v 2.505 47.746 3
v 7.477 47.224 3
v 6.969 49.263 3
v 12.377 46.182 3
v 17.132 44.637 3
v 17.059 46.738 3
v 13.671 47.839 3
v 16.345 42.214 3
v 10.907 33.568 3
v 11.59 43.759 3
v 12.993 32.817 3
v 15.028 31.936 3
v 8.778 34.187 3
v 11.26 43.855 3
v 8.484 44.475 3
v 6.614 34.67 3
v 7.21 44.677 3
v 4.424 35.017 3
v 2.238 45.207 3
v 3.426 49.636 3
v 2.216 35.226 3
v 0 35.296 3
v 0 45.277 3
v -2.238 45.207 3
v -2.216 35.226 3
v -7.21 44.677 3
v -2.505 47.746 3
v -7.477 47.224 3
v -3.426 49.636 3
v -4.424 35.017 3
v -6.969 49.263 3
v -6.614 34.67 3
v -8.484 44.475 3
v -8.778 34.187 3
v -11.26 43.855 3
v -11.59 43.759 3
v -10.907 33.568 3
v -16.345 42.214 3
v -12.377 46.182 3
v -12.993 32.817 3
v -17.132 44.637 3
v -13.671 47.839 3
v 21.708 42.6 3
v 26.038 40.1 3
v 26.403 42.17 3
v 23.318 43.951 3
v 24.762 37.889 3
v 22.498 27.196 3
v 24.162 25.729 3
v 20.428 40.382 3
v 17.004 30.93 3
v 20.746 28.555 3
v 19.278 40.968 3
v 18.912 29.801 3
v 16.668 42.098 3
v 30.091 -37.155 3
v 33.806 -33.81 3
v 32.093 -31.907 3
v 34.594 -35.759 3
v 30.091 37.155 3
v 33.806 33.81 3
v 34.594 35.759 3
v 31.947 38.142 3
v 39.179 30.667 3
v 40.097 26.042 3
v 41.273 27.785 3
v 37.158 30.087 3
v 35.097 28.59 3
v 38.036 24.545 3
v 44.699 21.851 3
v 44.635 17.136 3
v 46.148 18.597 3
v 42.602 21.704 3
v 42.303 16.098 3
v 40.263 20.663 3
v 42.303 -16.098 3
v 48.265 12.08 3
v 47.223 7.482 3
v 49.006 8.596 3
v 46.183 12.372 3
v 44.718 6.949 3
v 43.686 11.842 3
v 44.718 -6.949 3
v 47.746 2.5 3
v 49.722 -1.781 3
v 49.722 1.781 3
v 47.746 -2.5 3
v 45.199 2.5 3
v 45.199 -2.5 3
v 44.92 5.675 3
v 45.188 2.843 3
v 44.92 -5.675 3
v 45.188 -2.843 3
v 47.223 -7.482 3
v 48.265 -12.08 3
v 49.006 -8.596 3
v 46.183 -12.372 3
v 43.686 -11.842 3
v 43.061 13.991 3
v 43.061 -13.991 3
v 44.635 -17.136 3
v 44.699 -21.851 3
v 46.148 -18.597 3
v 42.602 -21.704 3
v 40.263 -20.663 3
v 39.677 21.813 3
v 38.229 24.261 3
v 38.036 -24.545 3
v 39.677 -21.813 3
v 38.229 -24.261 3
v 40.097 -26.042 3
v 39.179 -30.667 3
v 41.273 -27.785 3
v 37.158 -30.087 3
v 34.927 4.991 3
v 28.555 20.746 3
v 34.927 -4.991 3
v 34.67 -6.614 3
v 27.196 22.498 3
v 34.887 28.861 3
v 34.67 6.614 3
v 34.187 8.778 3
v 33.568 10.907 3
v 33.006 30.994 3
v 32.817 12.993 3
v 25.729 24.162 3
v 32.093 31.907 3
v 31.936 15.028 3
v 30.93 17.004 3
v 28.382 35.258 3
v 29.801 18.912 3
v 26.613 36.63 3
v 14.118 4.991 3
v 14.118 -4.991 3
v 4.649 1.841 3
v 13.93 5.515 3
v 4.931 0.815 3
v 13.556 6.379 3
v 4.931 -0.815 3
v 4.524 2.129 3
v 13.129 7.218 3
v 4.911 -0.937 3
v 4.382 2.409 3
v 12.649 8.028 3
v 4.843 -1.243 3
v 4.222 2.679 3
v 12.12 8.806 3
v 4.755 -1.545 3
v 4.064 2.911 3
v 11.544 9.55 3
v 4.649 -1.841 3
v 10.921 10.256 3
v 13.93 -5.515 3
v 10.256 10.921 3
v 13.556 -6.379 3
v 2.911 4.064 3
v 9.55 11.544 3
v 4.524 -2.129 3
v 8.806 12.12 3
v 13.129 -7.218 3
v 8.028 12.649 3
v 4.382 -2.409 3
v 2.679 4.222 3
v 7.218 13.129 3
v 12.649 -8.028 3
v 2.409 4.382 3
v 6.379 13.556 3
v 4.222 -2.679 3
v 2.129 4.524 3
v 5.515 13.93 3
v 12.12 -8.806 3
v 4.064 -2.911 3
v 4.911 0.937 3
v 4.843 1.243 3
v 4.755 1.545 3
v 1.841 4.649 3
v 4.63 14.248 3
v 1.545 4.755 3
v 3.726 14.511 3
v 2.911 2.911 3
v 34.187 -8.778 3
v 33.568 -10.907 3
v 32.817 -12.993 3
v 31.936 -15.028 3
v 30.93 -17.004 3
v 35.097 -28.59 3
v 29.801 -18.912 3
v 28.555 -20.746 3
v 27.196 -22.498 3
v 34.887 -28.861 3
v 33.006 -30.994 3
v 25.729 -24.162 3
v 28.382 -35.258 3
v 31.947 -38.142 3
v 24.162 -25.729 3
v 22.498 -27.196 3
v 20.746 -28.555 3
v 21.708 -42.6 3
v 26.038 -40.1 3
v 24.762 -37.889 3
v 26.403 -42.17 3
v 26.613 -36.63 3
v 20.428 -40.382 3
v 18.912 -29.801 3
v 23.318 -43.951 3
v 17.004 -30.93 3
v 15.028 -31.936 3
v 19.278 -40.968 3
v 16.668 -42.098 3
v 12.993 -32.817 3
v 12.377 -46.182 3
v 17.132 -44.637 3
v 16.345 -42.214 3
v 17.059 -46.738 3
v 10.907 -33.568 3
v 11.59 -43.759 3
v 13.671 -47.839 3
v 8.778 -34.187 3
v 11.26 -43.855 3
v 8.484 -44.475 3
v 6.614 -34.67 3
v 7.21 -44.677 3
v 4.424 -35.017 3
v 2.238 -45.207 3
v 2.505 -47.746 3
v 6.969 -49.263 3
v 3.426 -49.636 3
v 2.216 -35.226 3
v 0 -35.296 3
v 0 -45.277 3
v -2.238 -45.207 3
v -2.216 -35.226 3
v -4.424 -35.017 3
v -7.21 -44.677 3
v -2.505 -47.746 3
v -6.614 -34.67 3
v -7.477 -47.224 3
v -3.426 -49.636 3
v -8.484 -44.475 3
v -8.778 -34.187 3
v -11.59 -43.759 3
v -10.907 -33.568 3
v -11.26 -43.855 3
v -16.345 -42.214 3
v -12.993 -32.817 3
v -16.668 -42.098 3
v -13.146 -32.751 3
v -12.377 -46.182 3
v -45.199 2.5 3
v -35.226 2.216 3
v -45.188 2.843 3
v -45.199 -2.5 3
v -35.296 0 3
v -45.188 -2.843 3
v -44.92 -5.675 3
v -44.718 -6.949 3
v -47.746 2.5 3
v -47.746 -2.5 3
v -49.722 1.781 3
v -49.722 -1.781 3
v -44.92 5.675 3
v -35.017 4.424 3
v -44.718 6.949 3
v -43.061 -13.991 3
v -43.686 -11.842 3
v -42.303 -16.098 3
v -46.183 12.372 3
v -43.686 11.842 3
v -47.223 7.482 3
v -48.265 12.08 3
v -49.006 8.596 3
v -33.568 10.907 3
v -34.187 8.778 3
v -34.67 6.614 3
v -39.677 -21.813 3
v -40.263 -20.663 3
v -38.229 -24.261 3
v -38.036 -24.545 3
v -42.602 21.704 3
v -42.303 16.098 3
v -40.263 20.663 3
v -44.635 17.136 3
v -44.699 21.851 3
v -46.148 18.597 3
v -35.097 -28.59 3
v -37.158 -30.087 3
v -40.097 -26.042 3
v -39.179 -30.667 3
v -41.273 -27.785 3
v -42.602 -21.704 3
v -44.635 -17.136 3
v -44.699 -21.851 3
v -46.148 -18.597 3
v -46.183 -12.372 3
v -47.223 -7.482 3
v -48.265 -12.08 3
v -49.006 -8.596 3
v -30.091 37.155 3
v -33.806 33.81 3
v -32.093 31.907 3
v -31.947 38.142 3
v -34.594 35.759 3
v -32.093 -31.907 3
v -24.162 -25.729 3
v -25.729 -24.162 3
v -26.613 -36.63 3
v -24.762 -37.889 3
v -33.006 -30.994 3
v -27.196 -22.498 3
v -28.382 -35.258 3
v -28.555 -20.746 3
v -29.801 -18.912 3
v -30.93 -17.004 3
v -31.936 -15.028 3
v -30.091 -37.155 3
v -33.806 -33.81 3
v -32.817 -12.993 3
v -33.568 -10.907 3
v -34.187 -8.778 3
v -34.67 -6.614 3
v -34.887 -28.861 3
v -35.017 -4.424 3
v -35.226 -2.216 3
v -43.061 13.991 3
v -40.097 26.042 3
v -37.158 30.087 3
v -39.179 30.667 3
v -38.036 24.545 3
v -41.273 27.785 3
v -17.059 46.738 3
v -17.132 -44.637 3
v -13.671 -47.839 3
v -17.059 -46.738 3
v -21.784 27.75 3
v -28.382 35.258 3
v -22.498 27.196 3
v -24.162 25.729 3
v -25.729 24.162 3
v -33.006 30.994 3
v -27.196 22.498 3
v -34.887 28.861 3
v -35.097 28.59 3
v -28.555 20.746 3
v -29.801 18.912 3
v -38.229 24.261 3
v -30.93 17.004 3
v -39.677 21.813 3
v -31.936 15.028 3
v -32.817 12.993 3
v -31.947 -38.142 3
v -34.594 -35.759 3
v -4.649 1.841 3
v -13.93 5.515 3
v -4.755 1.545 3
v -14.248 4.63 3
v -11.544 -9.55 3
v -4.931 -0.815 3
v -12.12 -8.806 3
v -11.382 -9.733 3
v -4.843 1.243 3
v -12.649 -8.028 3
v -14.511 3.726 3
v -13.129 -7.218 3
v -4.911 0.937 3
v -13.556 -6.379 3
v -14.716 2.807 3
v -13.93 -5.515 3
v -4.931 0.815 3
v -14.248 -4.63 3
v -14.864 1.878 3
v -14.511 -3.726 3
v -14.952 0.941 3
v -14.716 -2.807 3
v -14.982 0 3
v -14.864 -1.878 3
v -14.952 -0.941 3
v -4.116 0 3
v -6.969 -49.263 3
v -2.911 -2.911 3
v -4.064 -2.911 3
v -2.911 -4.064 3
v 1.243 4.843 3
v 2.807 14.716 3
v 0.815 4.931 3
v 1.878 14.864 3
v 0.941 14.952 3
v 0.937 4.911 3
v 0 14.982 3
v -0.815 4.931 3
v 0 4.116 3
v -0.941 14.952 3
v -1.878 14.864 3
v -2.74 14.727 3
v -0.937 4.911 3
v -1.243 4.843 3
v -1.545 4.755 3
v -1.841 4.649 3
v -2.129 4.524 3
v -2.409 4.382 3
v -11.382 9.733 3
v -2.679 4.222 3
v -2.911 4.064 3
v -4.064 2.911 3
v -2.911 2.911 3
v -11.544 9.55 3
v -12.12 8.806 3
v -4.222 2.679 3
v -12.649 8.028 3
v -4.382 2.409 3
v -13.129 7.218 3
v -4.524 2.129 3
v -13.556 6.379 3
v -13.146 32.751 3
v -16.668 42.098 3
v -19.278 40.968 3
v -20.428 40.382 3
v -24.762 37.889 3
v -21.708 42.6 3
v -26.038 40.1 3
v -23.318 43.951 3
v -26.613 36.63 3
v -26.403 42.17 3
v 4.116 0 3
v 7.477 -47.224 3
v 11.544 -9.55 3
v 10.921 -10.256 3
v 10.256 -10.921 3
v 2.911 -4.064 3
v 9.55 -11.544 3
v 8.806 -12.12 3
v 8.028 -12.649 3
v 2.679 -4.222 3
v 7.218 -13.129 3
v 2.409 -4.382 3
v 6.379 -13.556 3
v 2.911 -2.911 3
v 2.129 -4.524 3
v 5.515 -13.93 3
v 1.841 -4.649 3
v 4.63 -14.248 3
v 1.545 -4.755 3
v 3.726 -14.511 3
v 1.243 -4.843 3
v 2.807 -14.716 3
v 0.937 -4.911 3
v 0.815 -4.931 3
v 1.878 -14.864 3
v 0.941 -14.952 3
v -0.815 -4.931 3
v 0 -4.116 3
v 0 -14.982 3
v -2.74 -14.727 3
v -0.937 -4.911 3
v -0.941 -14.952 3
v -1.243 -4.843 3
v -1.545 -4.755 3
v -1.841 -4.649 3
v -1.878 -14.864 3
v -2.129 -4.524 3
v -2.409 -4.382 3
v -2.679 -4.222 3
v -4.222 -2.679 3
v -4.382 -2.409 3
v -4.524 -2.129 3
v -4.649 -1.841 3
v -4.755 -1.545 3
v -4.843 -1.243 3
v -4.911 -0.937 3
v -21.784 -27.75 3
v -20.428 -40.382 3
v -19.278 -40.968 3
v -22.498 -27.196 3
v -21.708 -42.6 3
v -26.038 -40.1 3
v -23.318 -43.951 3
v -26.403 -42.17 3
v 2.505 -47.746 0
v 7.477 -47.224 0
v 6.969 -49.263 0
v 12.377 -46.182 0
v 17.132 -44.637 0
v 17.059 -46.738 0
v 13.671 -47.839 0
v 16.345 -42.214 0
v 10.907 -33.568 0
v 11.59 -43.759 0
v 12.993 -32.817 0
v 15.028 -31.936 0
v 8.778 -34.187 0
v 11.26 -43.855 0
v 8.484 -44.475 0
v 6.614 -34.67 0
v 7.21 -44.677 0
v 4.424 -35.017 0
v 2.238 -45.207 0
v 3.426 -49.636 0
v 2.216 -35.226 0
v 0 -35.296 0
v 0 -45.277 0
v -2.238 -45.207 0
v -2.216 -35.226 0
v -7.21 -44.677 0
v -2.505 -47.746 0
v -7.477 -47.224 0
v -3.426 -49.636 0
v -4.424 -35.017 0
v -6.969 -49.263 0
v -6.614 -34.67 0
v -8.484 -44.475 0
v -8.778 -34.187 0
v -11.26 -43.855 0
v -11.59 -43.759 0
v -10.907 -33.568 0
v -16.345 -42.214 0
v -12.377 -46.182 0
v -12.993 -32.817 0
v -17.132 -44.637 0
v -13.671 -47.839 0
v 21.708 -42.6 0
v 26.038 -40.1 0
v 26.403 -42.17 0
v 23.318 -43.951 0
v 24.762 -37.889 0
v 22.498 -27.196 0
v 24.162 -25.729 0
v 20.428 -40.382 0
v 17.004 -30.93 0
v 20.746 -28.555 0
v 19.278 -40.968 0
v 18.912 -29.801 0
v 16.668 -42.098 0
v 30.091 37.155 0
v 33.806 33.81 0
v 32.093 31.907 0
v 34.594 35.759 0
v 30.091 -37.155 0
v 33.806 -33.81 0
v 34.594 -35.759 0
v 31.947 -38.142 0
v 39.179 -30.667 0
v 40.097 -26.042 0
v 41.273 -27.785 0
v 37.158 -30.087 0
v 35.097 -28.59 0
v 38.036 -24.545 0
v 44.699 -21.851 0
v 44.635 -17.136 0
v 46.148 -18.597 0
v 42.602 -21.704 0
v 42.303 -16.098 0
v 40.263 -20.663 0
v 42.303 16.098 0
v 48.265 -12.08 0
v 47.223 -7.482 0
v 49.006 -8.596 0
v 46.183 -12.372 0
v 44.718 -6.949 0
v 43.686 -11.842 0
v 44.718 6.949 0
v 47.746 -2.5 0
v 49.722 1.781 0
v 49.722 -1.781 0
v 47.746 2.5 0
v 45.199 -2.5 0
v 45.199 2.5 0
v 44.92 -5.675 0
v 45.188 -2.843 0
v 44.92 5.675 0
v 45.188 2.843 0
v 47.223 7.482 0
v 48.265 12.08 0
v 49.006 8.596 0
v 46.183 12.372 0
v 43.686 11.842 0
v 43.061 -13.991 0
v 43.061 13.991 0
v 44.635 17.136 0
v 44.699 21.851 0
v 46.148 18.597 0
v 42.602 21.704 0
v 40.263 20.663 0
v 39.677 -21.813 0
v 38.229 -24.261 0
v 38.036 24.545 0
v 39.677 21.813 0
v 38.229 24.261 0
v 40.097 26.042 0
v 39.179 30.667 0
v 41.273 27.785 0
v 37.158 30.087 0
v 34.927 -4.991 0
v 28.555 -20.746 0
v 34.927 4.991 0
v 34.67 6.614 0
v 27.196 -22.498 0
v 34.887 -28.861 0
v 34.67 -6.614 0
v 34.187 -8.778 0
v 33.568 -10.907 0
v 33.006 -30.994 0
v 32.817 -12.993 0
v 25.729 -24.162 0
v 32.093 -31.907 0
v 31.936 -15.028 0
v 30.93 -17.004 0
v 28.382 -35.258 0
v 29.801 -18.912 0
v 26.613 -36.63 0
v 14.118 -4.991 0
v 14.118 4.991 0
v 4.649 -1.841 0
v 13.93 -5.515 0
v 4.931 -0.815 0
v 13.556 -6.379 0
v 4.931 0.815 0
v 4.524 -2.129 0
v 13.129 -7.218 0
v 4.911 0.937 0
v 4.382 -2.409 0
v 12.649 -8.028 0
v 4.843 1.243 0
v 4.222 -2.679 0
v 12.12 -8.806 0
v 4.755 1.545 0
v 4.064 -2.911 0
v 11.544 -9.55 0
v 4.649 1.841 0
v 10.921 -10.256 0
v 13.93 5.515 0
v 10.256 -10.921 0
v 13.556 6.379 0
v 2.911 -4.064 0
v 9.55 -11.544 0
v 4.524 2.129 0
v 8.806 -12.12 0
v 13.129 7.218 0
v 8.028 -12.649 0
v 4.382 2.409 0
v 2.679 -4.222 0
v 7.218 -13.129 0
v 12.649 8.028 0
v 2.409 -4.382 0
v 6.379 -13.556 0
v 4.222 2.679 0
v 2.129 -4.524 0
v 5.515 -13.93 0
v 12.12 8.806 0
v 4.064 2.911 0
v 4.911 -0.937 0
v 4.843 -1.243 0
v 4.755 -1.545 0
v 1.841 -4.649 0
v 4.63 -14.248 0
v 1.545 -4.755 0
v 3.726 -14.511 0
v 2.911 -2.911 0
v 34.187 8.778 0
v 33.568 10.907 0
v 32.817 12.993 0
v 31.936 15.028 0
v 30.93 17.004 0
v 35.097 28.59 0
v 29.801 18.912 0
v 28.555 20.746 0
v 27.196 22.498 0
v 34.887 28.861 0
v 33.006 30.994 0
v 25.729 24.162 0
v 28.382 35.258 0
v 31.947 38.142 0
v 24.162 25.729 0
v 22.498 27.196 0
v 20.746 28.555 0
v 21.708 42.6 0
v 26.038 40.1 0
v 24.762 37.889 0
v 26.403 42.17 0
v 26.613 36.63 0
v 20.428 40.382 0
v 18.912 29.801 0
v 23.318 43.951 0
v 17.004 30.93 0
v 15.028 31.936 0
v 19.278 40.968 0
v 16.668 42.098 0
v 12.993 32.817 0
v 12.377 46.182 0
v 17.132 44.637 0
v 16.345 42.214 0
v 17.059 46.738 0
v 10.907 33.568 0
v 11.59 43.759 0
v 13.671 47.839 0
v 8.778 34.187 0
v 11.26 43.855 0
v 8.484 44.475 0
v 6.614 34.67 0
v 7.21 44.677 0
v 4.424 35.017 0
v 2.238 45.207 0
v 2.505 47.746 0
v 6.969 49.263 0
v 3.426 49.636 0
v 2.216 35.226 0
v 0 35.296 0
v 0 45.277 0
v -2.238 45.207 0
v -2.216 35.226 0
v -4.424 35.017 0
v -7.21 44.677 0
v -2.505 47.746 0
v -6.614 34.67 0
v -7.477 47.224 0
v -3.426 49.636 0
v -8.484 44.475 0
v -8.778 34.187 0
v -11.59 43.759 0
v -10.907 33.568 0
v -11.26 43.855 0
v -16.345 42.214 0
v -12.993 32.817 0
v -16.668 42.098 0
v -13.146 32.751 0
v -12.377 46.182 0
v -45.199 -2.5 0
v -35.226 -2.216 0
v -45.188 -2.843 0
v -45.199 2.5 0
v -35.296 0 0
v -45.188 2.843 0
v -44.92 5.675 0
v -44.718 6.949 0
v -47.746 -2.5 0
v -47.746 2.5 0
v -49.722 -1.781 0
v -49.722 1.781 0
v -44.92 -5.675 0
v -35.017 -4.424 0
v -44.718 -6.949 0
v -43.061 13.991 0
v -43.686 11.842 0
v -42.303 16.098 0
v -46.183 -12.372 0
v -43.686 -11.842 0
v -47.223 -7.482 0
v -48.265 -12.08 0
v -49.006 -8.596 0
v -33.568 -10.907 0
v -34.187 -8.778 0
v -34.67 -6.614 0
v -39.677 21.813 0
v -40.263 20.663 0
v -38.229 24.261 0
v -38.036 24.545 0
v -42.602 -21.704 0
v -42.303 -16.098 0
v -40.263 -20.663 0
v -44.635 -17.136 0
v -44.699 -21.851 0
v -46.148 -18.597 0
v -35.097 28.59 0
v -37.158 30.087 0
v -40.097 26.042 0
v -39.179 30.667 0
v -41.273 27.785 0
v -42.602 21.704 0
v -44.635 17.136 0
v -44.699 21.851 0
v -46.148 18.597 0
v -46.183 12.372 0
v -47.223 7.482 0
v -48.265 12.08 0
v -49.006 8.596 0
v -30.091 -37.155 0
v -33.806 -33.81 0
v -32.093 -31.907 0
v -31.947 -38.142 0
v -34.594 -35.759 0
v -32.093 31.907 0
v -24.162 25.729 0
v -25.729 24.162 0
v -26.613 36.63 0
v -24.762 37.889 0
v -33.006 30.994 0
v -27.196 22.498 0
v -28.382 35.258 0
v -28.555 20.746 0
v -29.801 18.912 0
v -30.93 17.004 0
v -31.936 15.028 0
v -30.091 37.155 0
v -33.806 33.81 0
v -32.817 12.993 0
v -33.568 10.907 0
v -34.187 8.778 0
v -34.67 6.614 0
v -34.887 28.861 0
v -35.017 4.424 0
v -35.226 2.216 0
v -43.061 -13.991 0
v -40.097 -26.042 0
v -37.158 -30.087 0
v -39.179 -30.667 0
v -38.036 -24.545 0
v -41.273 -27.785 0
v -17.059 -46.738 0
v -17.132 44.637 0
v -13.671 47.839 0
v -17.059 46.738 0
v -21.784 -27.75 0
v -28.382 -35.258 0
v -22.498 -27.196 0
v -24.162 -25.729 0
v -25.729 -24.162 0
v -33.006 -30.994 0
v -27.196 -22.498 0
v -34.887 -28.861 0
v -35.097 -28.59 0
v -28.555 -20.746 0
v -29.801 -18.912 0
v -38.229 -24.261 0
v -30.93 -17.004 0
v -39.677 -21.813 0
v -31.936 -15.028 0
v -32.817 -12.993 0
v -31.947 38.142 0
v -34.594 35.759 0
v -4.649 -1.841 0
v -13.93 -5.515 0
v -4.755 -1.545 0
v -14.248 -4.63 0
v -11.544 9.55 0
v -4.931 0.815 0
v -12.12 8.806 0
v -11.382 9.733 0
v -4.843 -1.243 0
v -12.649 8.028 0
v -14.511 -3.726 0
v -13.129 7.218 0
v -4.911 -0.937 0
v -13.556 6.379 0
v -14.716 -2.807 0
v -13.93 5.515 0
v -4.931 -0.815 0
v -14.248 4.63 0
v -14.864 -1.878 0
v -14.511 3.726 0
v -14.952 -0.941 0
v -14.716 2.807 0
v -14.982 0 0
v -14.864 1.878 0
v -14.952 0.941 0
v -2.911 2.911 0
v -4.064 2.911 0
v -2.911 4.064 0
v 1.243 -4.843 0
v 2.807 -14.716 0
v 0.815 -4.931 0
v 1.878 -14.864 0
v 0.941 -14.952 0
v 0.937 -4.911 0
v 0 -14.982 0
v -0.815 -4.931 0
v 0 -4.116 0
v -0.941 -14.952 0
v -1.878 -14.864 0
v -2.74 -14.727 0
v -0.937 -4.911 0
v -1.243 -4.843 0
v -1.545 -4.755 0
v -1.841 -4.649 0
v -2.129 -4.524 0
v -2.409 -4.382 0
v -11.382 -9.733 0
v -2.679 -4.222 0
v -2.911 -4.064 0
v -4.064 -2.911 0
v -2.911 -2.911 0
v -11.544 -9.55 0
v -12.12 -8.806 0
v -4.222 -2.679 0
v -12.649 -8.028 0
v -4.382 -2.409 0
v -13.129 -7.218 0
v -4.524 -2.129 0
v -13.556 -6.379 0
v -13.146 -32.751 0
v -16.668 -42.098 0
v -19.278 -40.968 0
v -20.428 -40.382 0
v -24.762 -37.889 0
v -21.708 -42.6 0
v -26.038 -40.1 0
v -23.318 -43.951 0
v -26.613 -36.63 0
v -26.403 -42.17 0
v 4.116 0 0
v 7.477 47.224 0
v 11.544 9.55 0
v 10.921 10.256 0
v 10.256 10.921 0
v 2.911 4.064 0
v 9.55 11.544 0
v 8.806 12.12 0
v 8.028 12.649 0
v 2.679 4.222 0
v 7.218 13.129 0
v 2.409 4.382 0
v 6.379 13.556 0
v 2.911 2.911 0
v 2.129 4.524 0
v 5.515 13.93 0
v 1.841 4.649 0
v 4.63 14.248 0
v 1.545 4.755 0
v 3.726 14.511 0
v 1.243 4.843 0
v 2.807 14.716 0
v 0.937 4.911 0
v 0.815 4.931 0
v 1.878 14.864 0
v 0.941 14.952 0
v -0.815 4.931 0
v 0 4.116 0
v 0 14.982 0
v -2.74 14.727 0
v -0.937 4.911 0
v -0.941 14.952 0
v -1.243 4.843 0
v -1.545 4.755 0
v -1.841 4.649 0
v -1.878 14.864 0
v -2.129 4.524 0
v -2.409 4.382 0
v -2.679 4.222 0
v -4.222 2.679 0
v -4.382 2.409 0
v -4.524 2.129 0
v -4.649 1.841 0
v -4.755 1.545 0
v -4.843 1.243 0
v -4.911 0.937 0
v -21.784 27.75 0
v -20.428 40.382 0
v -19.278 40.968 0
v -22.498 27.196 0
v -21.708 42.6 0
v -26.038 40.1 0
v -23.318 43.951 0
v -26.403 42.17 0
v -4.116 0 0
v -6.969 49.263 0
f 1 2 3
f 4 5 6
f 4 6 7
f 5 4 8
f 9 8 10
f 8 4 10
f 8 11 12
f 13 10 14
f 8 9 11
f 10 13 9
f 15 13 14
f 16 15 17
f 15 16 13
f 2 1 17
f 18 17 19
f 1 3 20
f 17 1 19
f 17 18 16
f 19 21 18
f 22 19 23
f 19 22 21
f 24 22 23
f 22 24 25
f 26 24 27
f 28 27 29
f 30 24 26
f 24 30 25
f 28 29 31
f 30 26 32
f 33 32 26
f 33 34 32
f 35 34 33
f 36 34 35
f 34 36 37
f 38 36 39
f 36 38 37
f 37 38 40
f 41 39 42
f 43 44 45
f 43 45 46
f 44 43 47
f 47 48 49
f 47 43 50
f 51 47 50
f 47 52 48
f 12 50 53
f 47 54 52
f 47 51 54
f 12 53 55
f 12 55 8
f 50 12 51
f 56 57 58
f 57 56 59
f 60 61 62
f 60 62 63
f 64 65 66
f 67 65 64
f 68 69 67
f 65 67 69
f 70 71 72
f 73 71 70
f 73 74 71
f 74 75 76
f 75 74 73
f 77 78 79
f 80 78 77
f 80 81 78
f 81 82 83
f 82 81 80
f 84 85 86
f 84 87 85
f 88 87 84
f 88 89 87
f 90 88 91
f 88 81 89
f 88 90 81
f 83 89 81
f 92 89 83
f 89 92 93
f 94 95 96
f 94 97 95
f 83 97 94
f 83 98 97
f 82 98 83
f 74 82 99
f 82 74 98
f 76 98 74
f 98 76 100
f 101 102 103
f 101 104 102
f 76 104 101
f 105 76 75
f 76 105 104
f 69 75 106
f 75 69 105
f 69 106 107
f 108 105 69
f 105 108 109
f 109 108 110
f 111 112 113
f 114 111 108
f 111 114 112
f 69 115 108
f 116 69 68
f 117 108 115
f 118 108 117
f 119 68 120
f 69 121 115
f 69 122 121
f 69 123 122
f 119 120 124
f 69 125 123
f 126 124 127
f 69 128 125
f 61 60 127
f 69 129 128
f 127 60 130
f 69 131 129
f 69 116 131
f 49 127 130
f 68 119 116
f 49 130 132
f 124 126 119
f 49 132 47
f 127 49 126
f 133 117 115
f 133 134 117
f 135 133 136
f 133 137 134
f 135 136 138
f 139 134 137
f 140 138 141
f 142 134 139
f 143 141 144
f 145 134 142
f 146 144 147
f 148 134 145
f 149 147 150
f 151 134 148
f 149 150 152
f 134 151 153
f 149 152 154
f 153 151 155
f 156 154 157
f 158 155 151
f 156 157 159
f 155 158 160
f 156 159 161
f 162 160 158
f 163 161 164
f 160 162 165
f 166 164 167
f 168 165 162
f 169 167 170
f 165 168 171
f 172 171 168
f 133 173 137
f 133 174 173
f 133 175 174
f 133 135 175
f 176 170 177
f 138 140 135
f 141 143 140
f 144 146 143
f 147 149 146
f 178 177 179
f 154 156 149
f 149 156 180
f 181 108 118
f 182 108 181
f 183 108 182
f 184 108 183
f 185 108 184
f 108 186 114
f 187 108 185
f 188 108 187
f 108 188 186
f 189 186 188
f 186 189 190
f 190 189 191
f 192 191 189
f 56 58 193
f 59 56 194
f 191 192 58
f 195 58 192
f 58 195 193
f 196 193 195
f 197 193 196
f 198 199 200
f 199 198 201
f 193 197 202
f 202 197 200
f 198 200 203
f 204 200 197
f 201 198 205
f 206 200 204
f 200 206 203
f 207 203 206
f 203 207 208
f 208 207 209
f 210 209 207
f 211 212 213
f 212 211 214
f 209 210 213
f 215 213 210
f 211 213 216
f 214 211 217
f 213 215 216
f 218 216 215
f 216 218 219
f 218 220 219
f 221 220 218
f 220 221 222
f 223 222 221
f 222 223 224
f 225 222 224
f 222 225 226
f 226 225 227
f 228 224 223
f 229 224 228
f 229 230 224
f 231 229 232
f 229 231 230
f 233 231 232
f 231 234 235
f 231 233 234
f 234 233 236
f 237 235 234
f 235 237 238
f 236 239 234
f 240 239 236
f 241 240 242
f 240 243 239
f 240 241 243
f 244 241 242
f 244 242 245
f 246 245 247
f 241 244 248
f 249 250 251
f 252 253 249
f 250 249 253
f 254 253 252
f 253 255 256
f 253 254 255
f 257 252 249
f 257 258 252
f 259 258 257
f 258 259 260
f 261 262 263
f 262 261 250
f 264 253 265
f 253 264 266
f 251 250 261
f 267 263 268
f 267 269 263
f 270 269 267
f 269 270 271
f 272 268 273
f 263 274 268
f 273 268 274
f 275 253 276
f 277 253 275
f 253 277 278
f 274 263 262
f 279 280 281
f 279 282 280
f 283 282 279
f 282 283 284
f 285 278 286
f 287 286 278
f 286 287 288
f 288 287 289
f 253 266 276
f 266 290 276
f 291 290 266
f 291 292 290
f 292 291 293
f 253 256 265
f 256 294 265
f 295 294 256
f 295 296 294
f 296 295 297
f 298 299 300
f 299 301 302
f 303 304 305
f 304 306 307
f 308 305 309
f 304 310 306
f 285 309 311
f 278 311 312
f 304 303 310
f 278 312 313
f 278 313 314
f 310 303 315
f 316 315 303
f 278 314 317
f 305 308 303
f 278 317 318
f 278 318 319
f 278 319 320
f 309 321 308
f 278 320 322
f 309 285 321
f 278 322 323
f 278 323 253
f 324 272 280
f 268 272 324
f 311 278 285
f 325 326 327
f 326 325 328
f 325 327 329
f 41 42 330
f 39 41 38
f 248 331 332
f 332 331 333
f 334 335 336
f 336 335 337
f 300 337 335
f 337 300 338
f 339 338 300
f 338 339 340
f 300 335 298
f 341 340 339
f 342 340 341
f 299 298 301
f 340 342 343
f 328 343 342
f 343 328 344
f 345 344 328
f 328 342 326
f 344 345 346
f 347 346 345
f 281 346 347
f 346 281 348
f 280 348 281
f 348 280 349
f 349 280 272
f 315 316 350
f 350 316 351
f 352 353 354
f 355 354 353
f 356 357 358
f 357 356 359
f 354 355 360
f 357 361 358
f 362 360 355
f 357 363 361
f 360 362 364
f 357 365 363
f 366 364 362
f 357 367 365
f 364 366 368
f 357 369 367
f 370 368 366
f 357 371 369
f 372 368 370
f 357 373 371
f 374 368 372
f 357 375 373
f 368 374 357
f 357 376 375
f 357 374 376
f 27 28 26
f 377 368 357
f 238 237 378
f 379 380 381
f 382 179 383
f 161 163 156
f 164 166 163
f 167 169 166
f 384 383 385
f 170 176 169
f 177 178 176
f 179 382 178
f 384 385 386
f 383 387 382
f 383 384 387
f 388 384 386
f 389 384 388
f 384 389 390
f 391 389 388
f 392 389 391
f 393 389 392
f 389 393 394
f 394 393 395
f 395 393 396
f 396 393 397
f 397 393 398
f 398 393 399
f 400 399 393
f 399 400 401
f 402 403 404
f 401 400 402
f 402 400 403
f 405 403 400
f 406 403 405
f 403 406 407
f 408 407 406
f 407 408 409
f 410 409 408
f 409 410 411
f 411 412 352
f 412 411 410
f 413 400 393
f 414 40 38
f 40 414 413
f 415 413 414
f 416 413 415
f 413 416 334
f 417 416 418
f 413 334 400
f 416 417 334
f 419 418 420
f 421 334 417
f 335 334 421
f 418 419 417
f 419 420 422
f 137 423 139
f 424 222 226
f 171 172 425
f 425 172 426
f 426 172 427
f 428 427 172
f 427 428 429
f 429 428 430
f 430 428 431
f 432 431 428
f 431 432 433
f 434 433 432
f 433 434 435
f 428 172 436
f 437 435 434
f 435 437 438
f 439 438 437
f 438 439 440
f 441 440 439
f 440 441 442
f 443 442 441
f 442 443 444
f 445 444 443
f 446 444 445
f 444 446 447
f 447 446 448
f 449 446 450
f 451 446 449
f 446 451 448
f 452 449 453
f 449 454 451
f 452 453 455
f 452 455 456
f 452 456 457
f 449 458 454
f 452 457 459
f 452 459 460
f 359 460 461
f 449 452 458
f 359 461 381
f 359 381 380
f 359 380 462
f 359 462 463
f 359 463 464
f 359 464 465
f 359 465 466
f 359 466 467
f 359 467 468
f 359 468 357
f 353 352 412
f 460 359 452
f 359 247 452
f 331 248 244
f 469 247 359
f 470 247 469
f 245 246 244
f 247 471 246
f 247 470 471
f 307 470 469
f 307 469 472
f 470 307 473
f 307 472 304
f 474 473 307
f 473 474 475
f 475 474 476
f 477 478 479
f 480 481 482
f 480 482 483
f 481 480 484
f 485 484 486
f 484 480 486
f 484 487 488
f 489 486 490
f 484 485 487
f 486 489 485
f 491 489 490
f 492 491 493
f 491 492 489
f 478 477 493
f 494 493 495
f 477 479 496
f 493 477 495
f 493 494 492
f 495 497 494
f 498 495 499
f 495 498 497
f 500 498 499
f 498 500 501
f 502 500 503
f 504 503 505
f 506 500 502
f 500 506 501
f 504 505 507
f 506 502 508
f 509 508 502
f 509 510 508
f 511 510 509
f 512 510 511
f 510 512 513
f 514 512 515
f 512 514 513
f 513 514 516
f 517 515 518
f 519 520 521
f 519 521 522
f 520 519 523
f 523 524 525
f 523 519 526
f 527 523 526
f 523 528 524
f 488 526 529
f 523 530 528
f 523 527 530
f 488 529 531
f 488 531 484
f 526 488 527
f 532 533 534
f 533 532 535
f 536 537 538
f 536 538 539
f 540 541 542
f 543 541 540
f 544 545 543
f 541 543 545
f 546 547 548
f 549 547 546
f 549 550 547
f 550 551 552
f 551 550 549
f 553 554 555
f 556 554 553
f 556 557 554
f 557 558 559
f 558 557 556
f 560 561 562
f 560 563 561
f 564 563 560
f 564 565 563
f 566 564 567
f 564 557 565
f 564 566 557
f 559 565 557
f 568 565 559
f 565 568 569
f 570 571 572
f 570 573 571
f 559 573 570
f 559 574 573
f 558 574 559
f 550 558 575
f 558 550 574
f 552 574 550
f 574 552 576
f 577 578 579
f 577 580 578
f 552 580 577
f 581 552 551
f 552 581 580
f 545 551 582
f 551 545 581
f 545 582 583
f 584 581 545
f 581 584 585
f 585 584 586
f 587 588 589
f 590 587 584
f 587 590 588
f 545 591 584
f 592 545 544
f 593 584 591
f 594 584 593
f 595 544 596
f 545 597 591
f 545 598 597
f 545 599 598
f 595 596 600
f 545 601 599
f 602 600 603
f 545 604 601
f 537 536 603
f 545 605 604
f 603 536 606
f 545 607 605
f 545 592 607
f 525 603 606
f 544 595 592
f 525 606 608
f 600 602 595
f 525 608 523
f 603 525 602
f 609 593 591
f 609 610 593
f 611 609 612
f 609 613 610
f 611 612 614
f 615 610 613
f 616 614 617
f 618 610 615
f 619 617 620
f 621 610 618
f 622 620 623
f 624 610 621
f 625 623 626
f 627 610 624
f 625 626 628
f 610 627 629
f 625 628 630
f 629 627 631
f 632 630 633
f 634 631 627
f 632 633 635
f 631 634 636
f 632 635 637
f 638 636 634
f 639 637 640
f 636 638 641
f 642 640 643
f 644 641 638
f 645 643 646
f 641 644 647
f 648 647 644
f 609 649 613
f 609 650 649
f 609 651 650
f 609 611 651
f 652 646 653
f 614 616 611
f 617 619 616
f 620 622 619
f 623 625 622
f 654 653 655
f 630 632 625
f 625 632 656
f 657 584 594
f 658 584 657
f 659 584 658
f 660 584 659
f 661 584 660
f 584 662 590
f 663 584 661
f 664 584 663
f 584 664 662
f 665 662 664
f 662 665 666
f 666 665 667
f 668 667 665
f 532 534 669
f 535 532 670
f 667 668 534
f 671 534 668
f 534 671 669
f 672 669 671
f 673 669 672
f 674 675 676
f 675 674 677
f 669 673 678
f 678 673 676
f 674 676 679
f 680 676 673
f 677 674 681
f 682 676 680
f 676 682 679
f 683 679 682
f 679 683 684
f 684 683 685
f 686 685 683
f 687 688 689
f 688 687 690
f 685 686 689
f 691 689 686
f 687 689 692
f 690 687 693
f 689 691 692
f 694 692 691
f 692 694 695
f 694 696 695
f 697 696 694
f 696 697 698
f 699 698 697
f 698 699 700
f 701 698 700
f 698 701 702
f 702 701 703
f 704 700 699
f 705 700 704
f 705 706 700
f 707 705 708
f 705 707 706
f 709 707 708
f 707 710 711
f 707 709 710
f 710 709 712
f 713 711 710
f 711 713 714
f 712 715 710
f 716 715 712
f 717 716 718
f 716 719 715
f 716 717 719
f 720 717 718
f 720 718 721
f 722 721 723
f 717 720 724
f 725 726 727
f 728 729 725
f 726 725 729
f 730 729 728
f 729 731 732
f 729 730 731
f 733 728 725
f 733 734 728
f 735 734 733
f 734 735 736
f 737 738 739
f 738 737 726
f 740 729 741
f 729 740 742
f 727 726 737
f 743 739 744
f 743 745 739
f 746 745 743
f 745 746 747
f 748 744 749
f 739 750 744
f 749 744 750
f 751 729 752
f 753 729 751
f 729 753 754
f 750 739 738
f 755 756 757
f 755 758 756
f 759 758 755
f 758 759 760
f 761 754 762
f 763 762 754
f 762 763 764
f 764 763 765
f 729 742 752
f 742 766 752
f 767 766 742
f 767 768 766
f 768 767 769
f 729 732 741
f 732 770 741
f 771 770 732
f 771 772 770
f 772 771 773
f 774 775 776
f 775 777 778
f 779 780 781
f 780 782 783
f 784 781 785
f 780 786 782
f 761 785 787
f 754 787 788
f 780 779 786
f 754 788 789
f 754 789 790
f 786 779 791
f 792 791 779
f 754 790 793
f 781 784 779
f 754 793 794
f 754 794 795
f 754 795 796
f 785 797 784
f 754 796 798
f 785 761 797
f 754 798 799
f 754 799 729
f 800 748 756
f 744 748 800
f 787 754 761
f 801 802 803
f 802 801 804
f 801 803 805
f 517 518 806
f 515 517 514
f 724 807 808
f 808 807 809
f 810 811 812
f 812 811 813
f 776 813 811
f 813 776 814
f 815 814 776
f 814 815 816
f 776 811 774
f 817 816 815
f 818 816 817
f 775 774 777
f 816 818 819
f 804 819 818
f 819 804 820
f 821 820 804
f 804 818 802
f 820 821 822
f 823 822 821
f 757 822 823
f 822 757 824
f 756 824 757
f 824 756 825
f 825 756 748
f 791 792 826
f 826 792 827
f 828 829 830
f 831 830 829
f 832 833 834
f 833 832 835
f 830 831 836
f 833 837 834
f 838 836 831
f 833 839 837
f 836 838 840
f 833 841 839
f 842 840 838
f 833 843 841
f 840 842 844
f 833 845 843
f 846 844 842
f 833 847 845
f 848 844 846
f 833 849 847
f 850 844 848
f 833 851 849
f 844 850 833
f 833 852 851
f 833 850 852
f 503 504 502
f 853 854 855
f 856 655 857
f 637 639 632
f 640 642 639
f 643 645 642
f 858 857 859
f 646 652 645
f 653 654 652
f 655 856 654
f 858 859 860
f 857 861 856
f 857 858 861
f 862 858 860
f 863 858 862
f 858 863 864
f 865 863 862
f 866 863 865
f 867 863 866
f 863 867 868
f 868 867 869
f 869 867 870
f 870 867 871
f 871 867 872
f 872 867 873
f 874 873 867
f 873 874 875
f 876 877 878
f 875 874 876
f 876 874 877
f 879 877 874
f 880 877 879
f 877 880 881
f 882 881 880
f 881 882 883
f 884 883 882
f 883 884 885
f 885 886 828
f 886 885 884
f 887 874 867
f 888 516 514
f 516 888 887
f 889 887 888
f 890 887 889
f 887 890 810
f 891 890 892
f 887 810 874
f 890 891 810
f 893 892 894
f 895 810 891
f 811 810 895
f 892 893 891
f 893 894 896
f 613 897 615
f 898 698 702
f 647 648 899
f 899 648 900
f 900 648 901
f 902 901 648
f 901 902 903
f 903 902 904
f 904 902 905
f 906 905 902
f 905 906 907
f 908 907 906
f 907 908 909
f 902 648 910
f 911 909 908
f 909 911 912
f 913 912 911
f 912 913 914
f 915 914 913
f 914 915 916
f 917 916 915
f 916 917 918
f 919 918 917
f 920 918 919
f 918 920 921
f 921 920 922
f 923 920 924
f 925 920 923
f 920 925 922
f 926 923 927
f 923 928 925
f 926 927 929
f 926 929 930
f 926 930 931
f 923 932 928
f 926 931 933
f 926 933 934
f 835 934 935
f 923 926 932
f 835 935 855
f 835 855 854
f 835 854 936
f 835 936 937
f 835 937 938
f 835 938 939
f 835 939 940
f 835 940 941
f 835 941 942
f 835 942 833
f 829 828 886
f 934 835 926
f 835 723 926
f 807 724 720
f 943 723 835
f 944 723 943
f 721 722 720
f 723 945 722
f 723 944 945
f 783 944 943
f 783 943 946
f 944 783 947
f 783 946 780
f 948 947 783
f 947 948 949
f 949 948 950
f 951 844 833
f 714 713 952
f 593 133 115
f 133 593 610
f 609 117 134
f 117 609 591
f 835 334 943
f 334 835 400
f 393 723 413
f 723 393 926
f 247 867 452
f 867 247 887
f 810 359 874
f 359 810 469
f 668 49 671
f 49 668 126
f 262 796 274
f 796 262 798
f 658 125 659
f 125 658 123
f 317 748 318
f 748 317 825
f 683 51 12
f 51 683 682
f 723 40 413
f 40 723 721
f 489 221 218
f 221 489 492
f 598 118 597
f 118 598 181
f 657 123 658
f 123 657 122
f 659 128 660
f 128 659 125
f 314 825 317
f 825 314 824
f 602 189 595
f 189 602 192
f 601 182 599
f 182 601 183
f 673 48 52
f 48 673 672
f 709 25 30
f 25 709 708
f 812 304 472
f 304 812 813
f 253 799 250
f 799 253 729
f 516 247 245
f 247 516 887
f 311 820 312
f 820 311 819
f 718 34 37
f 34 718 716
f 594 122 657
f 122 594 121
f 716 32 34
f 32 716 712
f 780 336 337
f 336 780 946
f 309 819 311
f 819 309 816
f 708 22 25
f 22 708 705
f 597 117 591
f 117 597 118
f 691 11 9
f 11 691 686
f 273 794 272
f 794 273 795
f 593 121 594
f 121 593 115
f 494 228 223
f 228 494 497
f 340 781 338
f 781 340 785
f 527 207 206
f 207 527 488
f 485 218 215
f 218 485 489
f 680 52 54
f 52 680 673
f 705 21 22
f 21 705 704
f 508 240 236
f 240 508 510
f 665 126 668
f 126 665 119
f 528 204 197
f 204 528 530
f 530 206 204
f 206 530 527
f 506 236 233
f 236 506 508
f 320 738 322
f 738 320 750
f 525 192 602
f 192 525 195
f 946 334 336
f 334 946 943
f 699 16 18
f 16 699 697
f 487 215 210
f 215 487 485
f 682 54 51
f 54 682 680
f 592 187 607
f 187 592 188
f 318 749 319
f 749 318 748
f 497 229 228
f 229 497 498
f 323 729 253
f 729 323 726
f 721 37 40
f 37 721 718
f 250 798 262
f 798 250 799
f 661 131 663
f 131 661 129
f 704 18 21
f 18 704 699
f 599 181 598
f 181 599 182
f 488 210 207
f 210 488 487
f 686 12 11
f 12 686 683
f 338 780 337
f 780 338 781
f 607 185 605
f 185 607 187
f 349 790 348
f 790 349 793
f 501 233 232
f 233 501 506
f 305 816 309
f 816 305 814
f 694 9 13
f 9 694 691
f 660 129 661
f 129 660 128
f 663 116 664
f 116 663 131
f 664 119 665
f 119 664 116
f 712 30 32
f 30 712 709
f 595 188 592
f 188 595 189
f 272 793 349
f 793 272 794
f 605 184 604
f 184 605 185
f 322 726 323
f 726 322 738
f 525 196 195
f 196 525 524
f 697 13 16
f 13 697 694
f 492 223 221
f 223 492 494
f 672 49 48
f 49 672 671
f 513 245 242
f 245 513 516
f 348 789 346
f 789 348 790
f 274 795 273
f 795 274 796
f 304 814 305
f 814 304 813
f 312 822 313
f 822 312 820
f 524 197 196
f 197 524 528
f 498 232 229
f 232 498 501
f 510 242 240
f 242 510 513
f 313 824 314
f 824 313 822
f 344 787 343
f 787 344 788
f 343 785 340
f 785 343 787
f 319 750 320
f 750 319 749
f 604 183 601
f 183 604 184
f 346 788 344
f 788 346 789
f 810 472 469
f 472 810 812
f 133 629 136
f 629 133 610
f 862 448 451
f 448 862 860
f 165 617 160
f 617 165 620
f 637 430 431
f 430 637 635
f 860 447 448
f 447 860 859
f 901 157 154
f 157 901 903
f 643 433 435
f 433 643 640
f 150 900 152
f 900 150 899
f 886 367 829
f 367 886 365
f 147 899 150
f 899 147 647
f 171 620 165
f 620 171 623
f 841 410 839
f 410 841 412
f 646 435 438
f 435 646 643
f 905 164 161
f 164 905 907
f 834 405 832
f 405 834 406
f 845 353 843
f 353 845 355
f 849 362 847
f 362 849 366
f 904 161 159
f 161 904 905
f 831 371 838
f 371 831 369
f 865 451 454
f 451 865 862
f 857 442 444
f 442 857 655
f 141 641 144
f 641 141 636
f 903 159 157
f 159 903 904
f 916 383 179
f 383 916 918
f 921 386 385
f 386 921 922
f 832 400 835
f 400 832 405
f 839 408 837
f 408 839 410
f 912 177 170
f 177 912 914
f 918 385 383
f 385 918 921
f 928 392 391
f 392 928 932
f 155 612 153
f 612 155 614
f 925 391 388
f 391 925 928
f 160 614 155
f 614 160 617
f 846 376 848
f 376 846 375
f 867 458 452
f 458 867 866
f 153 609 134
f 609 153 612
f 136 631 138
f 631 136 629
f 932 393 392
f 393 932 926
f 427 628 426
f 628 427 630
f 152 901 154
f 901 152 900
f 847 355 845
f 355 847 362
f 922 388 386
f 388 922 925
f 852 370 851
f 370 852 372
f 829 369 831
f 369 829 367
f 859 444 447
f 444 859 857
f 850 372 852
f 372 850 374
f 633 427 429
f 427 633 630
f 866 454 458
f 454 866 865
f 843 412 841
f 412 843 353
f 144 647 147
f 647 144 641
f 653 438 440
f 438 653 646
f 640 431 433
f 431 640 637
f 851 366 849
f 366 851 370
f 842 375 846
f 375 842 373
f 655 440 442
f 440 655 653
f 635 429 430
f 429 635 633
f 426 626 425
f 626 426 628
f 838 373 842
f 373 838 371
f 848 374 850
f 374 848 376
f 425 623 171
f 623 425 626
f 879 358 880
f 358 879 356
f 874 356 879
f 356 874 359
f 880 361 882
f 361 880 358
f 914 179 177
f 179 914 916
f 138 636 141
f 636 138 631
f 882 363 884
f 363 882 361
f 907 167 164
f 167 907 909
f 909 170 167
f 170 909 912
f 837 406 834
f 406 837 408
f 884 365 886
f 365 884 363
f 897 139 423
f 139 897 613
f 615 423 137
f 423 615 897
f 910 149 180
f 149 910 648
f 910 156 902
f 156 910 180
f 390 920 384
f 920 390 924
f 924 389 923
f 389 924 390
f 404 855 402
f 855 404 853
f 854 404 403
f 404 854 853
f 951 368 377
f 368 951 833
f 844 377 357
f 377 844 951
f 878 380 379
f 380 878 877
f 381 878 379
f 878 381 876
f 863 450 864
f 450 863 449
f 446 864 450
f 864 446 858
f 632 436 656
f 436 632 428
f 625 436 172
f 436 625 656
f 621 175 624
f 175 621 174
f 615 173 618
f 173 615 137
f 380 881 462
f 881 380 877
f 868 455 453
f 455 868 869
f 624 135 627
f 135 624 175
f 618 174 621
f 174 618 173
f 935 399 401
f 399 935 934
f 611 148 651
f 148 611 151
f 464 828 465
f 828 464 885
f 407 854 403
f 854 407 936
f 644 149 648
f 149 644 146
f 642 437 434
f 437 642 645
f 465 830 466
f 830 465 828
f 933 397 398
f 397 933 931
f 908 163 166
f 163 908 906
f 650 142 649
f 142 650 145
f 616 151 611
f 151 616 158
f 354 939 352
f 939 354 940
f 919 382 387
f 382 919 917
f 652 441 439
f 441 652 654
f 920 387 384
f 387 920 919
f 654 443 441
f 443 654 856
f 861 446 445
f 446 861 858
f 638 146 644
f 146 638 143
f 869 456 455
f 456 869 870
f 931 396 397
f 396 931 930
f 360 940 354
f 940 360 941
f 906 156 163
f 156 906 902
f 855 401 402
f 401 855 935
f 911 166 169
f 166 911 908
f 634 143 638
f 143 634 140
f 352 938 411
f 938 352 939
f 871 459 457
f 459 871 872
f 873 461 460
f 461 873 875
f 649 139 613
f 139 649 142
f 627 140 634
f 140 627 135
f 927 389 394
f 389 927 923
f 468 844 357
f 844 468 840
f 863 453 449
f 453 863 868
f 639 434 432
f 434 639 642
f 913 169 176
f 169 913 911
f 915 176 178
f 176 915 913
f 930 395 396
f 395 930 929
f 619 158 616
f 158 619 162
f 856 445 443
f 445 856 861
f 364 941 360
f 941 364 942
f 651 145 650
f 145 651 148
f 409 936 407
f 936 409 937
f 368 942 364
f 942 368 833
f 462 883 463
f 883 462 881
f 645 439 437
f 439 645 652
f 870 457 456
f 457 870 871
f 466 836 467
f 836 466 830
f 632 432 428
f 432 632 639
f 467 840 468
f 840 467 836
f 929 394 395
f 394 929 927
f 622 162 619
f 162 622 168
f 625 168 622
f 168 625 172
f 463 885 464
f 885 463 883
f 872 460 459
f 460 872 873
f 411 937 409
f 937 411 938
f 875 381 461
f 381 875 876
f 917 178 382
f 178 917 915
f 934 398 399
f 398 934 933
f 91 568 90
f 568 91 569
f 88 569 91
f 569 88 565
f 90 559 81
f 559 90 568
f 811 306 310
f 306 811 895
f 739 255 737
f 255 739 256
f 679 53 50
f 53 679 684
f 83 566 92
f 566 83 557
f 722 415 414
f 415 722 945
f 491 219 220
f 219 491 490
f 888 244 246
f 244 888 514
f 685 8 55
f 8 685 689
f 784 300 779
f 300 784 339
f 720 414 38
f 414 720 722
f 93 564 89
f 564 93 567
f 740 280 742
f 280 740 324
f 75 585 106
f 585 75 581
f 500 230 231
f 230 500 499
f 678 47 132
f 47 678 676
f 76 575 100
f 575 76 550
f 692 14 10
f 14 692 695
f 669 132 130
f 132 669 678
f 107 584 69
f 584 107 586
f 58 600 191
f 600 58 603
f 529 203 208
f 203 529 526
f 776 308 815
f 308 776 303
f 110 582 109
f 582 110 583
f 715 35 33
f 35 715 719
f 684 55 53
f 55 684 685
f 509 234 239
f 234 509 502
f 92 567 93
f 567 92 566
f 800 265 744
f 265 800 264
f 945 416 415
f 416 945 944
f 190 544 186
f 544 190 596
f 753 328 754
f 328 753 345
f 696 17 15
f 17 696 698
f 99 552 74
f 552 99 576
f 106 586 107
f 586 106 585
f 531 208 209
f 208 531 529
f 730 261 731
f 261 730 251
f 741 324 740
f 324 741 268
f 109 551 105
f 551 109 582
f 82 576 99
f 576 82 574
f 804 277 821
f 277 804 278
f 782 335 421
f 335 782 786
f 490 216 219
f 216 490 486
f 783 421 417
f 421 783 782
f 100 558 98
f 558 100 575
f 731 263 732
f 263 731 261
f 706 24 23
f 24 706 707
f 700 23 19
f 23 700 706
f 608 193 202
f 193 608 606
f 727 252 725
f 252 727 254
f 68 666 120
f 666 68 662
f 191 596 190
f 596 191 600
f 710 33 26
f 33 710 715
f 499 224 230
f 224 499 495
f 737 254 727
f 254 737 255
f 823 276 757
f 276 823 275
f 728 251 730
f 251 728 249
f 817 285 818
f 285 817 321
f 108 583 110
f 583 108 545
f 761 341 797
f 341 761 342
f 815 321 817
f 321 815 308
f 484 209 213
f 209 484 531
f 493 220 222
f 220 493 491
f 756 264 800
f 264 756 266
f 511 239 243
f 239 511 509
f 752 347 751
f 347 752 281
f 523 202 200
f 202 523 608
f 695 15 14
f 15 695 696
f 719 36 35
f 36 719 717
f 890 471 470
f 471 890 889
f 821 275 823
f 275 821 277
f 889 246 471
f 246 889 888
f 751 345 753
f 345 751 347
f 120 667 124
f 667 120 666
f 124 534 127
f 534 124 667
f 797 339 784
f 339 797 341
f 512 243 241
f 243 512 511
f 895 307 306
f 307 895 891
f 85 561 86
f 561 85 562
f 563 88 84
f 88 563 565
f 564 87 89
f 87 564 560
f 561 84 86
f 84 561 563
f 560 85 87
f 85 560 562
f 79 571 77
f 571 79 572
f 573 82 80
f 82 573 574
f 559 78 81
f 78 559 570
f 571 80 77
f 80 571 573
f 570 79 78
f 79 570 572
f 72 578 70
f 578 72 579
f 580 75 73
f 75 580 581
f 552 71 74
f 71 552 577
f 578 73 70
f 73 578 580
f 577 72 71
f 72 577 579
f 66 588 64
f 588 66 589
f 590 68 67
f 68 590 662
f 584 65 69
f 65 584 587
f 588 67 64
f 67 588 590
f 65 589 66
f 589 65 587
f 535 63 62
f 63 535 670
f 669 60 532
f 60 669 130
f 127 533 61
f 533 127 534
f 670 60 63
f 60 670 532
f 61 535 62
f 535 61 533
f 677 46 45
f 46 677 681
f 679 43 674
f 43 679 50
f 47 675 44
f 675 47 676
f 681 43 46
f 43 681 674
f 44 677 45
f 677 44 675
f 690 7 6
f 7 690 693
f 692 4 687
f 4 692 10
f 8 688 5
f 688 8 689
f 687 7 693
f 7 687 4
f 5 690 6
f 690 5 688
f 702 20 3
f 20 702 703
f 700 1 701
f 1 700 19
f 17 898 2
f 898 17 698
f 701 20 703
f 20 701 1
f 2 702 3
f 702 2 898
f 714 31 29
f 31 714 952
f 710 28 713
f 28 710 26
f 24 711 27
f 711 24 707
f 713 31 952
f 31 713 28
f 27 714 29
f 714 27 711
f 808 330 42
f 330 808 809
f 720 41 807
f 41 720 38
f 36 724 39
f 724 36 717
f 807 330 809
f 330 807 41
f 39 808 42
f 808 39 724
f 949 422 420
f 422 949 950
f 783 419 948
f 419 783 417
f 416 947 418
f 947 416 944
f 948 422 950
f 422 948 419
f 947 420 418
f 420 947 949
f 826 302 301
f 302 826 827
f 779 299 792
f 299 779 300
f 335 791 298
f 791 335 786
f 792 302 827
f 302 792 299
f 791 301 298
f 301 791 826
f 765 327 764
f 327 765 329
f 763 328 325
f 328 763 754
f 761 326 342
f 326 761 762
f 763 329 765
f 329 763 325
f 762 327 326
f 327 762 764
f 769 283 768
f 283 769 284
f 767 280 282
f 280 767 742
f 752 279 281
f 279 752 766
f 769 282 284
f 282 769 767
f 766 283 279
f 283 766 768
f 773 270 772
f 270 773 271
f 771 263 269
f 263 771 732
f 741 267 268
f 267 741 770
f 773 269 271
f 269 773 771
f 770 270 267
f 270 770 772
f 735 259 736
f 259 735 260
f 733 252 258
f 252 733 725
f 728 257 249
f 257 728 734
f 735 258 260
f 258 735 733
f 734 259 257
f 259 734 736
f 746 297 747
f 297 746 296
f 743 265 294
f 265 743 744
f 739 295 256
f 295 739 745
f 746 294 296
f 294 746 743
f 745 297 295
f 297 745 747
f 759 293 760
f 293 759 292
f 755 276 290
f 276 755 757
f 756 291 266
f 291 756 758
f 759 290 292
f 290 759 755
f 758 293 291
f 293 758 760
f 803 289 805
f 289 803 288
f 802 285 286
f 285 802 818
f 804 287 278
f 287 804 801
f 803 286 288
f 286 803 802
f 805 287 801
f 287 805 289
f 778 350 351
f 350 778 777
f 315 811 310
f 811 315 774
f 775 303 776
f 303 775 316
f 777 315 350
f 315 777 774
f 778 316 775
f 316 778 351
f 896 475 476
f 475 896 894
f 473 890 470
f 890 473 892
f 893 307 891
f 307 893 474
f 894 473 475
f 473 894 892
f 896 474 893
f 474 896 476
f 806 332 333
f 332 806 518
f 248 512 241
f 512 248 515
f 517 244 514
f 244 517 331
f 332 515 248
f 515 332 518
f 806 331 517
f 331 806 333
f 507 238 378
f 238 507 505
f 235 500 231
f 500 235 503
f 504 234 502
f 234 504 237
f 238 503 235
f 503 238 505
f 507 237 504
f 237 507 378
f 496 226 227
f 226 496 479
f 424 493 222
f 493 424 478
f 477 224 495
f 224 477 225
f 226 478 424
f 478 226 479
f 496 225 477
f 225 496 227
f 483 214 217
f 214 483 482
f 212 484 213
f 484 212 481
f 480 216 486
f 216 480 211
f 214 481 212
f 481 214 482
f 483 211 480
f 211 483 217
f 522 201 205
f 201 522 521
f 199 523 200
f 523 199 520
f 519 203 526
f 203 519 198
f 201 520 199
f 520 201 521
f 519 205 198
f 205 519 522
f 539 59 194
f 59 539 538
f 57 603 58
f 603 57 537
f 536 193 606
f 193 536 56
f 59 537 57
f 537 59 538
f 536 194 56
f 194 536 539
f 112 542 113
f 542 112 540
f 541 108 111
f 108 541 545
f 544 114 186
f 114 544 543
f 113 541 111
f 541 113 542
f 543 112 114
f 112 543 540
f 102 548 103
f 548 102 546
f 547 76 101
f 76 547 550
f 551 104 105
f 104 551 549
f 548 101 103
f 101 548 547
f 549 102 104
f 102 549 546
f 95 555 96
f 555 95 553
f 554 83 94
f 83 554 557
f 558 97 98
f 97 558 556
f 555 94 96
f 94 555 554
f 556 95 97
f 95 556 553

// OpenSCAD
// file: gear-shaft.scad
$fn=100;

module gear_shaft(_r, _h, _teeth=0) {

    difference() {
        cylinder(r=_r, h=_h);

        if (_teeth > 0) {
            for (_angle = [0 : 360 / _teeth : 359]) {
                translate([_r * cos(_angle), _r * sin(_angle), _h/2])
                rotate([0, 0, _angle + 45])
                cube([_r/4, _r/4, _h+2], true);
            }
        }
    }

}

gear_shaft(2.5, 10, 20);
// main file
use <gear-shaft.scad>

$fn=100;

M_PI = 3.141592653589;

// notes:
// pitch diameter == effective size of gear
// pitch diameter can be derived from:
//  - tooth spacing
//  - number of teeth

// spoke width is same as tooth spacing (projected linerally)
//  = (pitch_diameter / 2) * 2 * sin(theta/2)
// spoke holes are centered between shaft hole and pitch diameter
//   with distance of spoke width on either side

// Ideally, the pitch is 2.25 times the height of the teeth.
// pitch == tooth spacing
// http://reprap.org/wiki/Gear_design#teeth_shape

// addendum:dedendum typically 1:1.25
// http://school.mech.uwa.edu.au/~dwright/DANotes/gears/generation/generation.html

module gear(_r, _h, _teeth, _tooth_spacing, _pitch_angle, _shaft_diameter, _use_gear_shaft=1, _spokes=0) {

    _pitch_diameter = _teeth * _tooth_spacing / M_PI;
    _pitch_radius = _pitch_diameter / 2.0;
    _tooth_angle = 360 / _teeth;
    _tooth_chord_length = 2.0 * _pitch_radius * sin(_tooth_angle/2.0);
    _spoke_width = _tooth_chord_length;
    _tooth_height = _tooth_spacing / 2.25;
    _tooth_inset = _tooth_height * 1.25 / (1 + 1.25);
    _cylinder_radius = _pitch_radius - _tooth_inset;

    difference() {
        // base cylinder for gear
        cylinder(r = _cylinder_radius, h = _h);

        // spokes
        if (_spokes > 0) {
            difference() {
                translate([0,0,-1]) cylinder(r = _cylinder_radius - _spoke_width, h = _h+2);
                translate([0,0,-1]) cylinder(r = _shaft_diameter / 2.0 + _spoke_width, h = _h+2);
                for (_i = [0 : _spokes - 1]) {
                    rotate([0, 0, _i * 360 / _spokes])
                      translate([0, -_spoke_width / 2.0, 0])
                        cube([_cylinder_radius - _spoke_width, _spoke_width, _h]);
                }
            }
        }

        // shaft hole
        translate([0, 0, -1]) gear_shaft(_r = _shaft_diameter / 2.0, _h = _h + 2, _teeth = _use_gear_shaft);
    }

    // gear teeth
    for (_i = [0 : _teeth - 1]) {
        translate([_cylinder_radius * cos(_i * 360 / _teeth), _cylinder_radius * sin(_i * 360 / _teeth), 0])
          rotate([0, 0, _i * 360 / _teeth])
            translate([0, -_tooth_spacing / 2.0 / 2.0, 0])
              difference() {
                  // base tooth
                  translate([-1, 0, 0])
                  cube([_tooth_height + 1, _tooth_spacing / 2.0, _h]);


                  // mask off teeth with pitch angle at pitch radius

                  translate([_tooth_inset, _tooth_spacing / 2.0, -1])
                  rotate([0, 0, -_pitch_angle])
                  cube([_tooth_height, _tooth_spacing / 2.0, _h+2]);

                  // guide cube for debugging
                  translate([_tooth_inset, _tooth_spacing / 2.0, -1])
                  * cube([_tooth_height, _tooth_spacing / 2.0, _h+2]);


                  translate([_tooth_inset, 0/*-_tooth_spacing / 2.0*/, -1])
                  translate([0, 0, _h+2])
                  rotate([-180, 0, 0])
                  rotate([0, 0, -_pitch_angle])
                  cube([_tooth_height, _tooth_spacing / 2.0, _h+2]);

                  // guide cube for debugging
                  translate([_tooth_inset, -_tooth_spacing / 2.0, -1])
                  * cube([_tooth_height, _tooth_spacing / 2.0, _h+2]);
              }
    }

}

gear(0, 3, 30, 10, 20, 10, 8, 3);


/*
translate([0, 0, 3])
//translate([30 * 10 / M_PI / 2 + 10 * 10 / M_PI / 2, 0, 0])
//rotate([0, 0, 360 / 10 / 2])
color("green") gear(0, 3, 10, 10, 20, 0, 0, 3);



translate([0, 0, -15])
color("red") gear_shaft(5, 30, 8);
*/
